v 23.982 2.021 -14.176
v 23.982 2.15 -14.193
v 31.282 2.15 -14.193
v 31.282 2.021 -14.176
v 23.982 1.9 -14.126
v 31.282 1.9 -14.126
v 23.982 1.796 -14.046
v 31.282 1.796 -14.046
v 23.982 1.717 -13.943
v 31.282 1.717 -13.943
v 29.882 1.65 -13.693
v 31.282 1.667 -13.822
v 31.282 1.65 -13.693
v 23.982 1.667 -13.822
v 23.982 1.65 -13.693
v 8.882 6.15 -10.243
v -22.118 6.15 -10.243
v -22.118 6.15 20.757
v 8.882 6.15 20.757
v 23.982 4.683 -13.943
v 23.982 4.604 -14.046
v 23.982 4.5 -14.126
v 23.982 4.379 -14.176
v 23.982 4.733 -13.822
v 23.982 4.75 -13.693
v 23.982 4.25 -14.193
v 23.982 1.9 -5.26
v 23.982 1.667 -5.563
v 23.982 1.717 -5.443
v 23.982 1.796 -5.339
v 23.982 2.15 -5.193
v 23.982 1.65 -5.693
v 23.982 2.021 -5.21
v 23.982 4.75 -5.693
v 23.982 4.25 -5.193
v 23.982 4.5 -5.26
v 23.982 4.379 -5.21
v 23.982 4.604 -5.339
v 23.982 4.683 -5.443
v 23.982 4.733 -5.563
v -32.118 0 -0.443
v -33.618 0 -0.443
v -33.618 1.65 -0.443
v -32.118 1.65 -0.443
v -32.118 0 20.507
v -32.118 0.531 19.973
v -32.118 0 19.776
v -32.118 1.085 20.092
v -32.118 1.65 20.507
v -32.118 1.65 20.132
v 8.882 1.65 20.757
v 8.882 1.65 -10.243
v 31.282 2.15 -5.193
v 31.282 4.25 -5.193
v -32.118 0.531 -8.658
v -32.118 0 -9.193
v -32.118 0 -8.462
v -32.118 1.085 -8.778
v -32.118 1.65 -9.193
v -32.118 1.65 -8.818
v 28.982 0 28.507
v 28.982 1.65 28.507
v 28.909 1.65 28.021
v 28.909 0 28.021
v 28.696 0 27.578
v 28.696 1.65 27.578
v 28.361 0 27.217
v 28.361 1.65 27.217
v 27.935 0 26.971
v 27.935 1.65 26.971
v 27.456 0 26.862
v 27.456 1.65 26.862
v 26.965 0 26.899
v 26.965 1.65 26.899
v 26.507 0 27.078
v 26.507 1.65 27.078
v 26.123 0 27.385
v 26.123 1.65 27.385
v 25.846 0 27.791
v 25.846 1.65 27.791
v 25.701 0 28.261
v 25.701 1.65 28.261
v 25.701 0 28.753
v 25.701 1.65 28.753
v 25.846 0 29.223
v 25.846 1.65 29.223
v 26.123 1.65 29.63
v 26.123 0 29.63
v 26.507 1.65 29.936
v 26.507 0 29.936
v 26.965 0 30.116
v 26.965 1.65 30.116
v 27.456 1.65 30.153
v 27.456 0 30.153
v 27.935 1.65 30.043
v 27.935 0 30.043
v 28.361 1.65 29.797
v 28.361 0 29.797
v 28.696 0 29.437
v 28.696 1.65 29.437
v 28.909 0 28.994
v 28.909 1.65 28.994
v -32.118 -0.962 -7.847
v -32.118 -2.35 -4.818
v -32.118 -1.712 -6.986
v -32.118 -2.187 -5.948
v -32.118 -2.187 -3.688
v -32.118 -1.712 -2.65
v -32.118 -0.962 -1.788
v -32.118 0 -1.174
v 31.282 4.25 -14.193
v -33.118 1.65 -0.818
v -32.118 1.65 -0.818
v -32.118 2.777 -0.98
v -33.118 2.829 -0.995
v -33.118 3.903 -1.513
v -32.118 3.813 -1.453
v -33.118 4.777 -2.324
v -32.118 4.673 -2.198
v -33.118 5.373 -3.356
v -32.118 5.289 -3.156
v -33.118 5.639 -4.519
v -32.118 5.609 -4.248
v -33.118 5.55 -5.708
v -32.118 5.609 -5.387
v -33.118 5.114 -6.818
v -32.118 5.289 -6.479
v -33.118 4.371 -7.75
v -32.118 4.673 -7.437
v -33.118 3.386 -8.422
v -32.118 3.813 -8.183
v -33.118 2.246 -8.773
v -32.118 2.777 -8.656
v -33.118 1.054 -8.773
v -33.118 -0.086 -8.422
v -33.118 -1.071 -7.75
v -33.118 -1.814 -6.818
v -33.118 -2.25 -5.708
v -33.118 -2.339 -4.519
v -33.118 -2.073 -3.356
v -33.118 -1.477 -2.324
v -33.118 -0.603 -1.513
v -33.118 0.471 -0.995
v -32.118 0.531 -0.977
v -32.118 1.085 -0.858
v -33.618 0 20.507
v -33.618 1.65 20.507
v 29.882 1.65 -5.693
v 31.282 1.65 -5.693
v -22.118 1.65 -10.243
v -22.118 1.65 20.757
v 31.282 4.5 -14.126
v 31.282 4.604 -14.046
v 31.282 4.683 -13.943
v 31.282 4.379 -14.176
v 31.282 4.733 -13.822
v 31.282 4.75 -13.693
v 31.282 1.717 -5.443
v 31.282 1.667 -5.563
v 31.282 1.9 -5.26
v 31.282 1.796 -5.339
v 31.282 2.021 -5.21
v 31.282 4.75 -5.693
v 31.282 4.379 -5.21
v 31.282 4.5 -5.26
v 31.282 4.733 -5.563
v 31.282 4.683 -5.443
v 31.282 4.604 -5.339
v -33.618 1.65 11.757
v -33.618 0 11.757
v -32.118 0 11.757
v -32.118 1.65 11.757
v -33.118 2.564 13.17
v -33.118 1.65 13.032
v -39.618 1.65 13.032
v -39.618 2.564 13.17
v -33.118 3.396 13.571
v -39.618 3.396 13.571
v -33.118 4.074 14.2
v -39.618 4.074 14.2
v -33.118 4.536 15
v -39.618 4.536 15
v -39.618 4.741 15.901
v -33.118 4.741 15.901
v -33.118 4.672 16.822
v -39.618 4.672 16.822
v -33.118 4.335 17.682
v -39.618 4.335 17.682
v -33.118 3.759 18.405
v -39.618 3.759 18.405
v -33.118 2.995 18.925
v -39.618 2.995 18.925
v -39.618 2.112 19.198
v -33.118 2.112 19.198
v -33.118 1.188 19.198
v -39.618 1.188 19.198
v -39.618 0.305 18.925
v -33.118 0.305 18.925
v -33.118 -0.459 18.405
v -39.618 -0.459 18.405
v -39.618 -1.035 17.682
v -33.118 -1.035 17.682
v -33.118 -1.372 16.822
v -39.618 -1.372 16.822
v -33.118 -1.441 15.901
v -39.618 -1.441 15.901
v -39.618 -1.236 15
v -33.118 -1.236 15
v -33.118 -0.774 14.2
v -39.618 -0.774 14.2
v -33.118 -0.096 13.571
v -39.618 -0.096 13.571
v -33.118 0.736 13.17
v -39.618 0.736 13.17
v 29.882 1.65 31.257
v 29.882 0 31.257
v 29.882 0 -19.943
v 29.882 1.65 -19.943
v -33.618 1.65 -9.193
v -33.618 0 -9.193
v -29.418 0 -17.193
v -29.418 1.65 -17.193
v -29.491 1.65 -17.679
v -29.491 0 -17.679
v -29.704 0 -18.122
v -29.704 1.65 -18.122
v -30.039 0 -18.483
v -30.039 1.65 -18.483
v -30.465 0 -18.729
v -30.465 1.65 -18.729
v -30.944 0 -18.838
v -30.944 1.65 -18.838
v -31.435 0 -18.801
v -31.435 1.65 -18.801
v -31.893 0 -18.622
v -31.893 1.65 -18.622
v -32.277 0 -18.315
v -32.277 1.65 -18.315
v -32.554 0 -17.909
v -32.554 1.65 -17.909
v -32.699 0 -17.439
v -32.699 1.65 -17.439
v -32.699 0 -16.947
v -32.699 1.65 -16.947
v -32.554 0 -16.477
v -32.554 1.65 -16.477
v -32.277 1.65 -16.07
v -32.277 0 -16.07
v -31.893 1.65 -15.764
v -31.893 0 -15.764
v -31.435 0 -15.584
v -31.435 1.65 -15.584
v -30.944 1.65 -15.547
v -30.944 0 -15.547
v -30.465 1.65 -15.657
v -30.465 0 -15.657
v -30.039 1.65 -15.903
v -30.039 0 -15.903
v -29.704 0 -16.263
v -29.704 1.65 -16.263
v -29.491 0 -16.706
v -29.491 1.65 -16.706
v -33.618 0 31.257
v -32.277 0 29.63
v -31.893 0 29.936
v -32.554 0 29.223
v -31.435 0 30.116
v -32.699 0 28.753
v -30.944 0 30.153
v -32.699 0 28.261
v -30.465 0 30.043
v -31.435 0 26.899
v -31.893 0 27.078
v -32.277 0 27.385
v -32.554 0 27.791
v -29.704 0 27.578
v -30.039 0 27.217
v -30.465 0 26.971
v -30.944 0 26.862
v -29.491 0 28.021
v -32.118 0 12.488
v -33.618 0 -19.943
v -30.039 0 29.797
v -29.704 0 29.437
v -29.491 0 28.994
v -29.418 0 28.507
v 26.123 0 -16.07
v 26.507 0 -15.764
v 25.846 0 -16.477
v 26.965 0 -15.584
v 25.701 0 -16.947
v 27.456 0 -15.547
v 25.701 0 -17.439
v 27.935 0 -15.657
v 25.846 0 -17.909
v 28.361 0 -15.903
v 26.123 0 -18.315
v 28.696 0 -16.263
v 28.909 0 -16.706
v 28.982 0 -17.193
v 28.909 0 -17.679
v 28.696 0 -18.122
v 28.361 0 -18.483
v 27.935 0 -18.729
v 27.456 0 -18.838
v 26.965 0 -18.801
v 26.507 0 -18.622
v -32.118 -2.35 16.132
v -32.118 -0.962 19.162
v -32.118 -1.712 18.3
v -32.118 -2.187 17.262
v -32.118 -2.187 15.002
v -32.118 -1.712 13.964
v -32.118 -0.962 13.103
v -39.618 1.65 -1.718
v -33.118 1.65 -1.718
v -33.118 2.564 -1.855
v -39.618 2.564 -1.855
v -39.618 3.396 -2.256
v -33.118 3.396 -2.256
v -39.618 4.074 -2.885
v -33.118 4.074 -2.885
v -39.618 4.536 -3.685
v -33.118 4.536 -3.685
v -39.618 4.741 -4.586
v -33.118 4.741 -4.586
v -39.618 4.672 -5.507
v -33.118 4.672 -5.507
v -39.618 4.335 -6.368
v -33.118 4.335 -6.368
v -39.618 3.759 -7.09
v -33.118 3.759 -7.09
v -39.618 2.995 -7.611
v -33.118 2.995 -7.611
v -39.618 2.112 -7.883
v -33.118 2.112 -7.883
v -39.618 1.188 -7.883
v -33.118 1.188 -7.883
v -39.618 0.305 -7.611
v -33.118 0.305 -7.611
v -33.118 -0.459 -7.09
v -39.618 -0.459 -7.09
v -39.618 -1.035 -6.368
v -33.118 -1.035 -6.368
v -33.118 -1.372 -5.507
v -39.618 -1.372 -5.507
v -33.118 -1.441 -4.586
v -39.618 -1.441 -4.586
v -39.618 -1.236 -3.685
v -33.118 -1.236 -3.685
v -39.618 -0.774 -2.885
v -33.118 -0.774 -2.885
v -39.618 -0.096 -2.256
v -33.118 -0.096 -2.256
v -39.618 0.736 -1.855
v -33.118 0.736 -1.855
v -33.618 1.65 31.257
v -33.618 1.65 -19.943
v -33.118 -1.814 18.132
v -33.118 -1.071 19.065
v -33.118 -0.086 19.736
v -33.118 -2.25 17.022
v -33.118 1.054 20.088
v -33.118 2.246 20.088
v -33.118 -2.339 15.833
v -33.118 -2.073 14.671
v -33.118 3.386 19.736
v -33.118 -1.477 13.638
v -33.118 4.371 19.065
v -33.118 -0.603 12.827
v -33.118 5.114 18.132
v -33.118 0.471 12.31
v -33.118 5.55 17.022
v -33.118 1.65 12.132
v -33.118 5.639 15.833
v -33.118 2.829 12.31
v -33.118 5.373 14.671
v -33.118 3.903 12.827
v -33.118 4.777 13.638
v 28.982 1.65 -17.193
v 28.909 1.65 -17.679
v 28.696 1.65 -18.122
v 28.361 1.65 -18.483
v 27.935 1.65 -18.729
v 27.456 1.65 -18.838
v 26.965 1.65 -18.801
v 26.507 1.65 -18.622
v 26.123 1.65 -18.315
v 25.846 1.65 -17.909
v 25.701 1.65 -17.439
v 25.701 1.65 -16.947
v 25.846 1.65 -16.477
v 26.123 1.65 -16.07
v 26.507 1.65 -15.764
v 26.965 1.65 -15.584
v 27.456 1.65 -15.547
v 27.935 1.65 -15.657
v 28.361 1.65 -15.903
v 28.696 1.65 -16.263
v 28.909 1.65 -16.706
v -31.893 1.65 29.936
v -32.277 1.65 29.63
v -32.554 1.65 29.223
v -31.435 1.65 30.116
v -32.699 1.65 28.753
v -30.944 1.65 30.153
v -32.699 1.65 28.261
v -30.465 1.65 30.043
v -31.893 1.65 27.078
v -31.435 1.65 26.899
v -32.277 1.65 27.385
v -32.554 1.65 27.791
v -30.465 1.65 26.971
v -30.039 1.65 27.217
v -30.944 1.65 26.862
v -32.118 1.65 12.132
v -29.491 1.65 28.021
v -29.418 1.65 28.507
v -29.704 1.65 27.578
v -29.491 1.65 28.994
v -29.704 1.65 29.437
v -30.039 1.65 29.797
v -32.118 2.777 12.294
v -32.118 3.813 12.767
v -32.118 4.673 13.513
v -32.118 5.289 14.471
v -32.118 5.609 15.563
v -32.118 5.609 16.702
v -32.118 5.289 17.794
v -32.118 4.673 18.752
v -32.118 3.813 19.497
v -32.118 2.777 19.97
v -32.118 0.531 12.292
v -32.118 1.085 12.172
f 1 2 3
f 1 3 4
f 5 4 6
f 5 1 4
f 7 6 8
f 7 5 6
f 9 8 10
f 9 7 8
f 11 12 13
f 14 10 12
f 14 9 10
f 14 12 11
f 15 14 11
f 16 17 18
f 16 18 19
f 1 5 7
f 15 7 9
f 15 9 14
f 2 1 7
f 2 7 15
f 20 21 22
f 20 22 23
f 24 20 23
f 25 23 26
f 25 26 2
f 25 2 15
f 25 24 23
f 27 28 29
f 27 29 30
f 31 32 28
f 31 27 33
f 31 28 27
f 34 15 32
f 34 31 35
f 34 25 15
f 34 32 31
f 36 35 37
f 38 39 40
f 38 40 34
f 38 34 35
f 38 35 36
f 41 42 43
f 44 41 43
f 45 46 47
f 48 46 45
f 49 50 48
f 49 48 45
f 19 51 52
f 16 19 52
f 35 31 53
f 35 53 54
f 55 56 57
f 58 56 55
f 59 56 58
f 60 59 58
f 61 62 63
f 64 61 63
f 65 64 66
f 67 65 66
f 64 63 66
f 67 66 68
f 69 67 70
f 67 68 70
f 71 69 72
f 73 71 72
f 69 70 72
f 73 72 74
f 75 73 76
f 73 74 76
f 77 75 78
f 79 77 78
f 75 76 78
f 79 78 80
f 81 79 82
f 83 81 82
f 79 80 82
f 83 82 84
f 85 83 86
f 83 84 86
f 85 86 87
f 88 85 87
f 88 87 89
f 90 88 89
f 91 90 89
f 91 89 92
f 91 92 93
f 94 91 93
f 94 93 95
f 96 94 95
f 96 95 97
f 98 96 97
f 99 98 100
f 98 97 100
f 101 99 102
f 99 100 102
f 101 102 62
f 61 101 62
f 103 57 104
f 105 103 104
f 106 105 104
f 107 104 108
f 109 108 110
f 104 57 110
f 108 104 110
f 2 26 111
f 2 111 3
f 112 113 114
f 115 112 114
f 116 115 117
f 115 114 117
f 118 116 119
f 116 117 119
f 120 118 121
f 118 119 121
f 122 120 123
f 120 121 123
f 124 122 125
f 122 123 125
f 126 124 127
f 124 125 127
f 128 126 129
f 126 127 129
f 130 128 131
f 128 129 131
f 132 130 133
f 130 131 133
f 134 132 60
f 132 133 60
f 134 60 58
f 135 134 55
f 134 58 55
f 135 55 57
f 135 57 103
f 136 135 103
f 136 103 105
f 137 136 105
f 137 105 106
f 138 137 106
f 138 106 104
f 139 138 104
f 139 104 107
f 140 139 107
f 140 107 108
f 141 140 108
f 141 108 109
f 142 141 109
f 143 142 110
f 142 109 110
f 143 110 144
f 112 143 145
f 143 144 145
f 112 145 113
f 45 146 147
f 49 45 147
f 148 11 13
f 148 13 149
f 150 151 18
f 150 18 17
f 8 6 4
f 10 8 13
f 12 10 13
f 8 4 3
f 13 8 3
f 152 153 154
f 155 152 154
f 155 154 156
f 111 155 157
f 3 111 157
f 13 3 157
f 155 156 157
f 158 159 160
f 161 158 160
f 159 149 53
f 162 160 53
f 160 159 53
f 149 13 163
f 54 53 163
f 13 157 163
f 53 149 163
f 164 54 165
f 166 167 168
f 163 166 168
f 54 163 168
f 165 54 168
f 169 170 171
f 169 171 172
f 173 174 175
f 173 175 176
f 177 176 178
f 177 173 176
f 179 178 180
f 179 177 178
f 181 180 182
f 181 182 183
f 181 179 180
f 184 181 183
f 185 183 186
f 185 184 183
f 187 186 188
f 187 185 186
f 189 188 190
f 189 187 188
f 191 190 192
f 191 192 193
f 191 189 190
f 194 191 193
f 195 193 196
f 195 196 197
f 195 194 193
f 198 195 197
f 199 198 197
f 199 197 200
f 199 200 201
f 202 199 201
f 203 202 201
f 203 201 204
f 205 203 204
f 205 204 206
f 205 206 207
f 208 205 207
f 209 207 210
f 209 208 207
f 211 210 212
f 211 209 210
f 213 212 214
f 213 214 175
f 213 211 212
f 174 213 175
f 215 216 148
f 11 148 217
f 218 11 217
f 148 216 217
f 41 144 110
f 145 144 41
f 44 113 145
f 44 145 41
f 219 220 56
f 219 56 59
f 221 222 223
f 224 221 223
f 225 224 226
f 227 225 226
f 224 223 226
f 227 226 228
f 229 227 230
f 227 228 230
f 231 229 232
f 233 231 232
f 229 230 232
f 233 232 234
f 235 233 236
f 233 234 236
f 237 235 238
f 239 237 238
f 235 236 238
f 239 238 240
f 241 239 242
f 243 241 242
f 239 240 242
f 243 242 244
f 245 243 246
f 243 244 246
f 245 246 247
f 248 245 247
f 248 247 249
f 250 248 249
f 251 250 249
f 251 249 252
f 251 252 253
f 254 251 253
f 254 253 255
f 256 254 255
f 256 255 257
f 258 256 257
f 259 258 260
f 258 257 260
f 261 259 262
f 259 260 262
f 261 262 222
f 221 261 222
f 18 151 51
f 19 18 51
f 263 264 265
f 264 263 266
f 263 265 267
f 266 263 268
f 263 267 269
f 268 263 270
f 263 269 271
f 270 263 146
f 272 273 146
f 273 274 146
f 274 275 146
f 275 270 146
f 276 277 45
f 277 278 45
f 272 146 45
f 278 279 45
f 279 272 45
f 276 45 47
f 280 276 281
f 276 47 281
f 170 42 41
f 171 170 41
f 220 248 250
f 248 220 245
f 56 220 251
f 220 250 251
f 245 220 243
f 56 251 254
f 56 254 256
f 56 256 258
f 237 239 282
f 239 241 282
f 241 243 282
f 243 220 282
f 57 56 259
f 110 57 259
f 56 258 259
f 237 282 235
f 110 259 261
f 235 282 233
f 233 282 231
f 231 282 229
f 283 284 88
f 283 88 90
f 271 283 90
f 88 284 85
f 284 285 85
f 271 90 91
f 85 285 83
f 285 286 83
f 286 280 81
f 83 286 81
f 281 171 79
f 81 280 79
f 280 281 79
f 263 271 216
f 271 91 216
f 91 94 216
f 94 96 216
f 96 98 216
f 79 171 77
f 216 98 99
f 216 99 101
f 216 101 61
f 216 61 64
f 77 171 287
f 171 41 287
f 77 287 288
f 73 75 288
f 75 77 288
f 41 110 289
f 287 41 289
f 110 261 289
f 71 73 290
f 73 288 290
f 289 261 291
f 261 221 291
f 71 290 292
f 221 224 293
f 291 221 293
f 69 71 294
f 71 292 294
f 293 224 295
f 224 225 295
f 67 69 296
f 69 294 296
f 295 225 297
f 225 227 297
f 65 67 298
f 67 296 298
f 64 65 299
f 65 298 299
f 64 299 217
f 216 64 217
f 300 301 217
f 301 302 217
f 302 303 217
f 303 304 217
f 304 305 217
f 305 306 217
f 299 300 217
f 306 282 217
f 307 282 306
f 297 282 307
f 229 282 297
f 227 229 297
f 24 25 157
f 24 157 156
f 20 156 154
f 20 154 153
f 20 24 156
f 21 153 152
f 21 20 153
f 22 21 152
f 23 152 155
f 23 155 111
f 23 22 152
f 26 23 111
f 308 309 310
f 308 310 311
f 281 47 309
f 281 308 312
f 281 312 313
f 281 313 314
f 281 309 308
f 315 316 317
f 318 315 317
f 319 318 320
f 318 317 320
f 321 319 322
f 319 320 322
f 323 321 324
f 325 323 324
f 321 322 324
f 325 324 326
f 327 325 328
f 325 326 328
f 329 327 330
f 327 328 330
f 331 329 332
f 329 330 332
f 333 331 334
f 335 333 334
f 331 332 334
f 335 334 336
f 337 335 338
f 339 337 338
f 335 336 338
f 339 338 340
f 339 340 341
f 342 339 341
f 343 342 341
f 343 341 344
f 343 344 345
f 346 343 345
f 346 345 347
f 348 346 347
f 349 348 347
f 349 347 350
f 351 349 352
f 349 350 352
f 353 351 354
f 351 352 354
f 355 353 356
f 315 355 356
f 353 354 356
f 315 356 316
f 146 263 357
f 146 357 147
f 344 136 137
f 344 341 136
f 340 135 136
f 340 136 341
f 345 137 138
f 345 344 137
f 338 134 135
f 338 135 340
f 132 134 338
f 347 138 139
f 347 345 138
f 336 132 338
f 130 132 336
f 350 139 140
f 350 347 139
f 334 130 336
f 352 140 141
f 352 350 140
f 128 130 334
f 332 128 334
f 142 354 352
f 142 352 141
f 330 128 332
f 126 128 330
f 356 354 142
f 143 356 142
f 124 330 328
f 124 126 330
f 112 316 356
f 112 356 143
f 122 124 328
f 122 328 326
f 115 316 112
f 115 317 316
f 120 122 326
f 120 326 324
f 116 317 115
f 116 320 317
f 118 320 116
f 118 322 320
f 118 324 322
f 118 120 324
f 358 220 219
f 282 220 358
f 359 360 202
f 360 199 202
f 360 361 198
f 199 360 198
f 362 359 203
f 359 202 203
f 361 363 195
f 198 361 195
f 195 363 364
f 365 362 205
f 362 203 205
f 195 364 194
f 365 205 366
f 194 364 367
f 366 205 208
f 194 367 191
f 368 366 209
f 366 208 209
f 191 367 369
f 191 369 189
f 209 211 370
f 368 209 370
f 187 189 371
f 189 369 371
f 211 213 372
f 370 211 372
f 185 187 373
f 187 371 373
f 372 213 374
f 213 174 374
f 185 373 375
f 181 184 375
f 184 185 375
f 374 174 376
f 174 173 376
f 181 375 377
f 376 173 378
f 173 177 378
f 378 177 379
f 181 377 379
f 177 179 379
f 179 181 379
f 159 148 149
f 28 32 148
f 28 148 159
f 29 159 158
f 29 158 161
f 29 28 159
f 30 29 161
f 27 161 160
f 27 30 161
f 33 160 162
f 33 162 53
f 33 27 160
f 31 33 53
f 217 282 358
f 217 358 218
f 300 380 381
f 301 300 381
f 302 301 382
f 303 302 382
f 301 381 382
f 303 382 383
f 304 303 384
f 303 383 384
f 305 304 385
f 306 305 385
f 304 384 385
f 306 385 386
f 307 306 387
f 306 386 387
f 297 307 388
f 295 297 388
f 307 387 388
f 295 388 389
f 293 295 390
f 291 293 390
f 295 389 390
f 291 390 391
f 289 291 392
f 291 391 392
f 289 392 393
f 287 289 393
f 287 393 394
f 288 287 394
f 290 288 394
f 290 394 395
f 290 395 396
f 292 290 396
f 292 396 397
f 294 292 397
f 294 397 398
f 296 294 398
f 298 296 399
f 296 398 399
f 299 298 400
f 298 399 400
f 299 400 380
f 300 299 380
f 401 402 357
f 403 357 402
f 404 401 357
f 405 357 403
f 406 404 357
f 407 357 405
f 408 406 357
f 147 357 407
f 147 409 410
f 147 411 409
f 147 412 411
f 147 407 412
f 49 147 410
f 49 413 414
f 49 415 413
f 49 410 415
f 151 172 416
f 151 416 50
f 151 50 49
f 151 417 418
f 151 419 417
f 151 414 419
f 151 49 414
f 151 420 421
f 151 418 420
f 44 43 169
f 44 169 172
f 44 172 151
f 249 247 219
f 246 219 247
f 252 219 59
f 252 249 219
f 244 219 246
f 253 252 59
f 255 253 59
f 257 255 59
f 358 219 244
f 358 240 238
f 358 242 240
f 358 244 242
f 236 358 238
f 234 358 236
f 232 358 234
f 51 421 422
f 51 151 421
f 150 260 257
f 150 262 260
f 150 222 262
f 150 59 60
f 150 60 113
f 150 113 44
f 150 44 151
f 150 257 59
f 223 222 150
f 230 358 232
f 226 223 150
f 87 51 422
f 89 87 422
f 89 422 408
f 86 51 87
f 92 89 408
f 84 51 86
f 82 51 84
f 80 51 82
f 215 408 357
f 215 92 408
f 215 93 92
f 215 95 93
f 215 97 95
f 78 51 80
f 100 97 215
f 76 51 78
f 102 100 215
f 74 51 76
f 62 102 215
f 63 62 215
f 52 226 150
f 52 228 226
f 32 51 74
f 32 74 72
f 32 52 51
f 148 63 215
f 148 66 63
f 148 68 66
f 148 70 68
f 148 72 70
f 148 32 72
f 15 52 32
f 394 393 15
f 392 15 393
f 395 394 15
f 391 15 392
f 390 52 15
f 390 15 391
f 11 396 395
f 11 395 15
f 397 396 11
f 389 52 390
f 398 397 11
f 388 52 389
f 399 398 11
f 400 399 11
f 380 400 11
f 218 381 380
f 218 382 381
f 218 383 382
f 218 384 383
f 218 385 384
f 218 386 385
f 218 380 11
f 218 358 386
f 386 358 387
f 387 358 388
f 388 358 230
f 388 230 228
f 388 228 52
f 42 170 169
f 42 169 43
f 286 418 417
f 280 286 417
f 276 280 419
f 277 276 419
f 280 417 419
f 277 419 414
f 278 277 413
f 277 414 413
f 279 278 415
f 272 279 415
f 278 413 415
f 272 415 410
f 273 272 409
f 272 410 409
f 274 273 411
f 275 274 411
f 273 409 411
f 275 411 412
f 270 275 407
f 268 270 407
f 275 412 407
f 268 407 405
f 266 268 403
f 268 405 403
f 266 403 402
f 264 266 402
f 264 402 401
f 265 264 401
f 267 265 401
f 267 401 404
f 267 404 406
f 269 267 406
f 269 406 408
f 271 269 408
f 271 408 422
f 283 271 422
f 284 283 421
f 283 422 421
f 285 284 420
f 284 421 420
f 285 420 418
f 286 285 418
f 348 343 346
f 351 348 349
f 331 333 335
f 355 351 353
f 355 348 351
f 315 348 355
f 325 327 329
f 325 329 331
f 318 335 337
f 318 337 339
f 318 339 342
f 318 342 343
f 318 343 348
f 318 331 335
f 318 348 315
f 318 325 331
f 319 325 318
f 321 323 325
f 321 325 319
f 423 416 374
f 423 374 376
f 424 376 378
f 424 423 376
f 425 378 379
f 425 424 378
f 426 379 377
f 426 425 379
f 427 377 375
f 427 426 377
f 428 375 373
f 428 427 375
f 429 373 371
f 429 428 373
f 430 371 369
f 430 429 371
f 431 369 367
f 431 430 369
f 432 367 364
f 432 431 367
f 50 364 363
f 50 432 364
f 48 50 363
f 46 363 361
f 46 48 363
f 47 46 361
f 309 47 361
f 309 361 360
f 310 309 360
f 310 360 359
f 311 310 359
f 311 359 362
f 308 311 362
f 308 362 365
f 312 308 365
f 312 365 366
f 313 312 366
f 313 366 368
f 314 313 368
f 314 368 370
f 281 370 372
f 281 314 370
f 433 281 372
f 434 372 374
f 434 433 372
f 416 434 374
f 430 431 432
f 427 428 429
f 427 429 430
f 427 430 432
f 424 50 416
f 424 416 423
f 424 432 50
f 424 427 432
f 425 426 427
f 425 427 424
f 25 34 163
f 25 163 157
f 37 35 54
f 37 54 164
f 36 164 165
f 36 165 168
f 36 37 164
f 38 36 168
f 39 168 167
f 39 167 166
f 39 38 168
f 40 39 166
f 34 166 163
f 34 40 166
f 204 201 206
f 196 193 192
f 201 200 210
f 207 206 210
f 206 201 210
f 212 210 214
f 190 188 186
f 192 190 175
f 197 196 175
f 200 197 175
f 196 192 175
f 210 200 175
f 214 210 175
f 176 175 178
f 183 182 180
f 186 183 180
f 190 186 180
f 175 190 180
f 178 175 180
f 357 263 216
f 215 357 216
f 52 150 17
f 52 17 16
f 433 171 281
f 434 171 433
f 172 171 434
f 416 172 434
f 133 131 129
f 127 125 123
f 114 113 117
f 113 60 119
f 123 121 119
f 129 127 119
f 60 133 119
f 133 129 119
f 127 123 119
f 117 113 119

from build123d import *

# Parameters (mm, degrees)
SKETCH1_W               = 63.5
SKETCH1_H               = 51.2
BOSS_EXTRUDE1_DEPTH     = 1.65
SKETCH2_W               = 31
SKETCH2_H               = 31
BOSS_EXTRUDE2_DEPTH     = 4.5
SKETCH3_W               = 8.75
SKETCH3_H               = 1.65
CUT_EXTRUDE1_DEPTH      = 1.5
SKETCH4_R               = 4
BOSS_EXTRUDE3_DEPTH     = 1
SKETCH5_R               = 3.1
BOSS_EXTRUDE4_DEPTH     = 6.5
SKETCH6_R               = 1.65
CUT_EXTRUDE2_DEPTH      = 5.5
CUT_EXTRUDE2_DEPTH_BACK = 1.65
BOSS_EXTRUDE5_DEPTH     = 7.3


with BuildPart() as part:
    # Sketch1 → Boss-Extrude1 (new body)
    with BuildSketch(Plane(origin=(0, 0, 0), x_dir=(1, 0, 0), z_dir=(0, 1, 0))):
        with Locations((-1.867647059, -5.657328016)):
            Rectangle(SKETCH1_W, SKETCH1_H)
    extrude(amount=BOSS_EXTRUDE1_DEPTH)

    # Sketch2 → Boss-Extrude2 (add)
    with BuildSketch(Plane(origin=(0, 1.65, 0), x_dir=(1, 0, 0), z_dir=(0, 1, 0))):
        with Locations((-6.617647059, -5.257328016)):
            Rectangle(SKETCH2_W, SKETCH2_H)
    extrude(amount=BOSS_EXTRUDE2_DEPTH)

    # Sketch3 → Cut-Extrude1 (cut)
    with BuildSketch(Plane.ZY.offset(33.617647059)):
        with Locations((-4.817671984, 0.825)):
            Rectangle(SKETCH3_W, SKETCH3_H)
        with Locations((16.132328016, 0.825)):
            Rectangle(SKETCH3_W, SKETCH3_H)
    extrude(amount=-CUT_EXTRUDE1_DEPTH, mode=Mode.SUBTRACT)

    # Sketch4 → Boss-Extrude3 (add)
    with BuildSketch(Plane.ZY.offset(32.117647059)):
        with Locations((-4.817671984, 1.65)):
            Circle(SKETCH4_R)
    boss_extrude3 = extrude(amount=BOSS_EXTRUDE3_DEPTH)

    # Sketch5 → Boss-Extrude4 (add)
    with BuildSketch(Plane.ZY.offset(33.117647059)):
        with Locations((-4.817671984, 1.65)):
            Circle(SKETCH5_R)
    boss_extrude4 = extrude(amount=BOSS_EXTRUDE4_DEPTH)

    # Mirror1: Boss-Extrude3, Boss-Extrude4 across plane
    add(boss_extrude3.mirror(Plane(origin=(0, 0, 5.657328016), x_dir=(1, 0, 0), z_dir=(0, 0, -1))))
    add(boss_extrude4.mirror(Plane(origin=(0, 0, 5.657328016), x_dir=(1, 0, 0), z_dir=(0, 0, -1))))

    # Sketch6 → Cut-Extrude2 (cut, two sides)
    with BuildSketch(Plane(origin=(0, 1.65, 0), x_dir=(1, 0, 0), z_dir=(0, 1, 0))) as cut_extrude2_sk:
        with Locations((-31.067647059, 17.192671984)):
            Circle(SKETCH6_R)
        with Locations((-31.067647059, -28.507328016)):
            Circle(SKETCH6_R)
        with Locations((27.332352941, -28.507328016)):
            Circle(SKETCH6_R)
        with Locations((27.332352941, 17.192671984)):
            Circle(SKETCH6_R)
    extrude(amount=CUT_EXTRUDE2_DEPTH, mode=Mode.SUBTRACT)
    extrude(cut_extrude2_sk.sketch, amount=-CUT_EXTRUDE2_DEPTH_BACK, mode=Mode.SUBTRACT)

    # Sketch7 → Boss-Extrude5 (add)
    with BuildSketch(Plane(origin=(23.982352941, 0, 0), x_dir=(0, 0, -1), z_dir=(1, 0, 0))):
        with BuildLine():
            Line((13.692671984, 1.65), (5.692671984, 1.65))
            ThreePointArc((5.692671984, 1.65), (5.339118593, 1.796446609), (5.192671984, 2.15))
            Line((5.192671984, 2.15), (5.192671984, 4.25))
            ThreePointArc((5.192671984, 4.25), (5.339118593, 4.603553391), (5.692671984, 4.75))
            Line((5.692671984, 4.75), (13.692671984, 4.75))
            ThreePointArc((13.692671984, 4.75), (14.046225375, 4.603553391), (14.192671984, 4.25))
            Line((14.192671984, 4.25), (14.192671984, 2.15))
            ThreePointArc((14.192671984, 2.15), (14.046225375, 1.796446609), (13.692671984, 1.65))
        make_face()
    extrude(amount=BOSS_EXTRUDE5_DEPTH)


solid = part.part
